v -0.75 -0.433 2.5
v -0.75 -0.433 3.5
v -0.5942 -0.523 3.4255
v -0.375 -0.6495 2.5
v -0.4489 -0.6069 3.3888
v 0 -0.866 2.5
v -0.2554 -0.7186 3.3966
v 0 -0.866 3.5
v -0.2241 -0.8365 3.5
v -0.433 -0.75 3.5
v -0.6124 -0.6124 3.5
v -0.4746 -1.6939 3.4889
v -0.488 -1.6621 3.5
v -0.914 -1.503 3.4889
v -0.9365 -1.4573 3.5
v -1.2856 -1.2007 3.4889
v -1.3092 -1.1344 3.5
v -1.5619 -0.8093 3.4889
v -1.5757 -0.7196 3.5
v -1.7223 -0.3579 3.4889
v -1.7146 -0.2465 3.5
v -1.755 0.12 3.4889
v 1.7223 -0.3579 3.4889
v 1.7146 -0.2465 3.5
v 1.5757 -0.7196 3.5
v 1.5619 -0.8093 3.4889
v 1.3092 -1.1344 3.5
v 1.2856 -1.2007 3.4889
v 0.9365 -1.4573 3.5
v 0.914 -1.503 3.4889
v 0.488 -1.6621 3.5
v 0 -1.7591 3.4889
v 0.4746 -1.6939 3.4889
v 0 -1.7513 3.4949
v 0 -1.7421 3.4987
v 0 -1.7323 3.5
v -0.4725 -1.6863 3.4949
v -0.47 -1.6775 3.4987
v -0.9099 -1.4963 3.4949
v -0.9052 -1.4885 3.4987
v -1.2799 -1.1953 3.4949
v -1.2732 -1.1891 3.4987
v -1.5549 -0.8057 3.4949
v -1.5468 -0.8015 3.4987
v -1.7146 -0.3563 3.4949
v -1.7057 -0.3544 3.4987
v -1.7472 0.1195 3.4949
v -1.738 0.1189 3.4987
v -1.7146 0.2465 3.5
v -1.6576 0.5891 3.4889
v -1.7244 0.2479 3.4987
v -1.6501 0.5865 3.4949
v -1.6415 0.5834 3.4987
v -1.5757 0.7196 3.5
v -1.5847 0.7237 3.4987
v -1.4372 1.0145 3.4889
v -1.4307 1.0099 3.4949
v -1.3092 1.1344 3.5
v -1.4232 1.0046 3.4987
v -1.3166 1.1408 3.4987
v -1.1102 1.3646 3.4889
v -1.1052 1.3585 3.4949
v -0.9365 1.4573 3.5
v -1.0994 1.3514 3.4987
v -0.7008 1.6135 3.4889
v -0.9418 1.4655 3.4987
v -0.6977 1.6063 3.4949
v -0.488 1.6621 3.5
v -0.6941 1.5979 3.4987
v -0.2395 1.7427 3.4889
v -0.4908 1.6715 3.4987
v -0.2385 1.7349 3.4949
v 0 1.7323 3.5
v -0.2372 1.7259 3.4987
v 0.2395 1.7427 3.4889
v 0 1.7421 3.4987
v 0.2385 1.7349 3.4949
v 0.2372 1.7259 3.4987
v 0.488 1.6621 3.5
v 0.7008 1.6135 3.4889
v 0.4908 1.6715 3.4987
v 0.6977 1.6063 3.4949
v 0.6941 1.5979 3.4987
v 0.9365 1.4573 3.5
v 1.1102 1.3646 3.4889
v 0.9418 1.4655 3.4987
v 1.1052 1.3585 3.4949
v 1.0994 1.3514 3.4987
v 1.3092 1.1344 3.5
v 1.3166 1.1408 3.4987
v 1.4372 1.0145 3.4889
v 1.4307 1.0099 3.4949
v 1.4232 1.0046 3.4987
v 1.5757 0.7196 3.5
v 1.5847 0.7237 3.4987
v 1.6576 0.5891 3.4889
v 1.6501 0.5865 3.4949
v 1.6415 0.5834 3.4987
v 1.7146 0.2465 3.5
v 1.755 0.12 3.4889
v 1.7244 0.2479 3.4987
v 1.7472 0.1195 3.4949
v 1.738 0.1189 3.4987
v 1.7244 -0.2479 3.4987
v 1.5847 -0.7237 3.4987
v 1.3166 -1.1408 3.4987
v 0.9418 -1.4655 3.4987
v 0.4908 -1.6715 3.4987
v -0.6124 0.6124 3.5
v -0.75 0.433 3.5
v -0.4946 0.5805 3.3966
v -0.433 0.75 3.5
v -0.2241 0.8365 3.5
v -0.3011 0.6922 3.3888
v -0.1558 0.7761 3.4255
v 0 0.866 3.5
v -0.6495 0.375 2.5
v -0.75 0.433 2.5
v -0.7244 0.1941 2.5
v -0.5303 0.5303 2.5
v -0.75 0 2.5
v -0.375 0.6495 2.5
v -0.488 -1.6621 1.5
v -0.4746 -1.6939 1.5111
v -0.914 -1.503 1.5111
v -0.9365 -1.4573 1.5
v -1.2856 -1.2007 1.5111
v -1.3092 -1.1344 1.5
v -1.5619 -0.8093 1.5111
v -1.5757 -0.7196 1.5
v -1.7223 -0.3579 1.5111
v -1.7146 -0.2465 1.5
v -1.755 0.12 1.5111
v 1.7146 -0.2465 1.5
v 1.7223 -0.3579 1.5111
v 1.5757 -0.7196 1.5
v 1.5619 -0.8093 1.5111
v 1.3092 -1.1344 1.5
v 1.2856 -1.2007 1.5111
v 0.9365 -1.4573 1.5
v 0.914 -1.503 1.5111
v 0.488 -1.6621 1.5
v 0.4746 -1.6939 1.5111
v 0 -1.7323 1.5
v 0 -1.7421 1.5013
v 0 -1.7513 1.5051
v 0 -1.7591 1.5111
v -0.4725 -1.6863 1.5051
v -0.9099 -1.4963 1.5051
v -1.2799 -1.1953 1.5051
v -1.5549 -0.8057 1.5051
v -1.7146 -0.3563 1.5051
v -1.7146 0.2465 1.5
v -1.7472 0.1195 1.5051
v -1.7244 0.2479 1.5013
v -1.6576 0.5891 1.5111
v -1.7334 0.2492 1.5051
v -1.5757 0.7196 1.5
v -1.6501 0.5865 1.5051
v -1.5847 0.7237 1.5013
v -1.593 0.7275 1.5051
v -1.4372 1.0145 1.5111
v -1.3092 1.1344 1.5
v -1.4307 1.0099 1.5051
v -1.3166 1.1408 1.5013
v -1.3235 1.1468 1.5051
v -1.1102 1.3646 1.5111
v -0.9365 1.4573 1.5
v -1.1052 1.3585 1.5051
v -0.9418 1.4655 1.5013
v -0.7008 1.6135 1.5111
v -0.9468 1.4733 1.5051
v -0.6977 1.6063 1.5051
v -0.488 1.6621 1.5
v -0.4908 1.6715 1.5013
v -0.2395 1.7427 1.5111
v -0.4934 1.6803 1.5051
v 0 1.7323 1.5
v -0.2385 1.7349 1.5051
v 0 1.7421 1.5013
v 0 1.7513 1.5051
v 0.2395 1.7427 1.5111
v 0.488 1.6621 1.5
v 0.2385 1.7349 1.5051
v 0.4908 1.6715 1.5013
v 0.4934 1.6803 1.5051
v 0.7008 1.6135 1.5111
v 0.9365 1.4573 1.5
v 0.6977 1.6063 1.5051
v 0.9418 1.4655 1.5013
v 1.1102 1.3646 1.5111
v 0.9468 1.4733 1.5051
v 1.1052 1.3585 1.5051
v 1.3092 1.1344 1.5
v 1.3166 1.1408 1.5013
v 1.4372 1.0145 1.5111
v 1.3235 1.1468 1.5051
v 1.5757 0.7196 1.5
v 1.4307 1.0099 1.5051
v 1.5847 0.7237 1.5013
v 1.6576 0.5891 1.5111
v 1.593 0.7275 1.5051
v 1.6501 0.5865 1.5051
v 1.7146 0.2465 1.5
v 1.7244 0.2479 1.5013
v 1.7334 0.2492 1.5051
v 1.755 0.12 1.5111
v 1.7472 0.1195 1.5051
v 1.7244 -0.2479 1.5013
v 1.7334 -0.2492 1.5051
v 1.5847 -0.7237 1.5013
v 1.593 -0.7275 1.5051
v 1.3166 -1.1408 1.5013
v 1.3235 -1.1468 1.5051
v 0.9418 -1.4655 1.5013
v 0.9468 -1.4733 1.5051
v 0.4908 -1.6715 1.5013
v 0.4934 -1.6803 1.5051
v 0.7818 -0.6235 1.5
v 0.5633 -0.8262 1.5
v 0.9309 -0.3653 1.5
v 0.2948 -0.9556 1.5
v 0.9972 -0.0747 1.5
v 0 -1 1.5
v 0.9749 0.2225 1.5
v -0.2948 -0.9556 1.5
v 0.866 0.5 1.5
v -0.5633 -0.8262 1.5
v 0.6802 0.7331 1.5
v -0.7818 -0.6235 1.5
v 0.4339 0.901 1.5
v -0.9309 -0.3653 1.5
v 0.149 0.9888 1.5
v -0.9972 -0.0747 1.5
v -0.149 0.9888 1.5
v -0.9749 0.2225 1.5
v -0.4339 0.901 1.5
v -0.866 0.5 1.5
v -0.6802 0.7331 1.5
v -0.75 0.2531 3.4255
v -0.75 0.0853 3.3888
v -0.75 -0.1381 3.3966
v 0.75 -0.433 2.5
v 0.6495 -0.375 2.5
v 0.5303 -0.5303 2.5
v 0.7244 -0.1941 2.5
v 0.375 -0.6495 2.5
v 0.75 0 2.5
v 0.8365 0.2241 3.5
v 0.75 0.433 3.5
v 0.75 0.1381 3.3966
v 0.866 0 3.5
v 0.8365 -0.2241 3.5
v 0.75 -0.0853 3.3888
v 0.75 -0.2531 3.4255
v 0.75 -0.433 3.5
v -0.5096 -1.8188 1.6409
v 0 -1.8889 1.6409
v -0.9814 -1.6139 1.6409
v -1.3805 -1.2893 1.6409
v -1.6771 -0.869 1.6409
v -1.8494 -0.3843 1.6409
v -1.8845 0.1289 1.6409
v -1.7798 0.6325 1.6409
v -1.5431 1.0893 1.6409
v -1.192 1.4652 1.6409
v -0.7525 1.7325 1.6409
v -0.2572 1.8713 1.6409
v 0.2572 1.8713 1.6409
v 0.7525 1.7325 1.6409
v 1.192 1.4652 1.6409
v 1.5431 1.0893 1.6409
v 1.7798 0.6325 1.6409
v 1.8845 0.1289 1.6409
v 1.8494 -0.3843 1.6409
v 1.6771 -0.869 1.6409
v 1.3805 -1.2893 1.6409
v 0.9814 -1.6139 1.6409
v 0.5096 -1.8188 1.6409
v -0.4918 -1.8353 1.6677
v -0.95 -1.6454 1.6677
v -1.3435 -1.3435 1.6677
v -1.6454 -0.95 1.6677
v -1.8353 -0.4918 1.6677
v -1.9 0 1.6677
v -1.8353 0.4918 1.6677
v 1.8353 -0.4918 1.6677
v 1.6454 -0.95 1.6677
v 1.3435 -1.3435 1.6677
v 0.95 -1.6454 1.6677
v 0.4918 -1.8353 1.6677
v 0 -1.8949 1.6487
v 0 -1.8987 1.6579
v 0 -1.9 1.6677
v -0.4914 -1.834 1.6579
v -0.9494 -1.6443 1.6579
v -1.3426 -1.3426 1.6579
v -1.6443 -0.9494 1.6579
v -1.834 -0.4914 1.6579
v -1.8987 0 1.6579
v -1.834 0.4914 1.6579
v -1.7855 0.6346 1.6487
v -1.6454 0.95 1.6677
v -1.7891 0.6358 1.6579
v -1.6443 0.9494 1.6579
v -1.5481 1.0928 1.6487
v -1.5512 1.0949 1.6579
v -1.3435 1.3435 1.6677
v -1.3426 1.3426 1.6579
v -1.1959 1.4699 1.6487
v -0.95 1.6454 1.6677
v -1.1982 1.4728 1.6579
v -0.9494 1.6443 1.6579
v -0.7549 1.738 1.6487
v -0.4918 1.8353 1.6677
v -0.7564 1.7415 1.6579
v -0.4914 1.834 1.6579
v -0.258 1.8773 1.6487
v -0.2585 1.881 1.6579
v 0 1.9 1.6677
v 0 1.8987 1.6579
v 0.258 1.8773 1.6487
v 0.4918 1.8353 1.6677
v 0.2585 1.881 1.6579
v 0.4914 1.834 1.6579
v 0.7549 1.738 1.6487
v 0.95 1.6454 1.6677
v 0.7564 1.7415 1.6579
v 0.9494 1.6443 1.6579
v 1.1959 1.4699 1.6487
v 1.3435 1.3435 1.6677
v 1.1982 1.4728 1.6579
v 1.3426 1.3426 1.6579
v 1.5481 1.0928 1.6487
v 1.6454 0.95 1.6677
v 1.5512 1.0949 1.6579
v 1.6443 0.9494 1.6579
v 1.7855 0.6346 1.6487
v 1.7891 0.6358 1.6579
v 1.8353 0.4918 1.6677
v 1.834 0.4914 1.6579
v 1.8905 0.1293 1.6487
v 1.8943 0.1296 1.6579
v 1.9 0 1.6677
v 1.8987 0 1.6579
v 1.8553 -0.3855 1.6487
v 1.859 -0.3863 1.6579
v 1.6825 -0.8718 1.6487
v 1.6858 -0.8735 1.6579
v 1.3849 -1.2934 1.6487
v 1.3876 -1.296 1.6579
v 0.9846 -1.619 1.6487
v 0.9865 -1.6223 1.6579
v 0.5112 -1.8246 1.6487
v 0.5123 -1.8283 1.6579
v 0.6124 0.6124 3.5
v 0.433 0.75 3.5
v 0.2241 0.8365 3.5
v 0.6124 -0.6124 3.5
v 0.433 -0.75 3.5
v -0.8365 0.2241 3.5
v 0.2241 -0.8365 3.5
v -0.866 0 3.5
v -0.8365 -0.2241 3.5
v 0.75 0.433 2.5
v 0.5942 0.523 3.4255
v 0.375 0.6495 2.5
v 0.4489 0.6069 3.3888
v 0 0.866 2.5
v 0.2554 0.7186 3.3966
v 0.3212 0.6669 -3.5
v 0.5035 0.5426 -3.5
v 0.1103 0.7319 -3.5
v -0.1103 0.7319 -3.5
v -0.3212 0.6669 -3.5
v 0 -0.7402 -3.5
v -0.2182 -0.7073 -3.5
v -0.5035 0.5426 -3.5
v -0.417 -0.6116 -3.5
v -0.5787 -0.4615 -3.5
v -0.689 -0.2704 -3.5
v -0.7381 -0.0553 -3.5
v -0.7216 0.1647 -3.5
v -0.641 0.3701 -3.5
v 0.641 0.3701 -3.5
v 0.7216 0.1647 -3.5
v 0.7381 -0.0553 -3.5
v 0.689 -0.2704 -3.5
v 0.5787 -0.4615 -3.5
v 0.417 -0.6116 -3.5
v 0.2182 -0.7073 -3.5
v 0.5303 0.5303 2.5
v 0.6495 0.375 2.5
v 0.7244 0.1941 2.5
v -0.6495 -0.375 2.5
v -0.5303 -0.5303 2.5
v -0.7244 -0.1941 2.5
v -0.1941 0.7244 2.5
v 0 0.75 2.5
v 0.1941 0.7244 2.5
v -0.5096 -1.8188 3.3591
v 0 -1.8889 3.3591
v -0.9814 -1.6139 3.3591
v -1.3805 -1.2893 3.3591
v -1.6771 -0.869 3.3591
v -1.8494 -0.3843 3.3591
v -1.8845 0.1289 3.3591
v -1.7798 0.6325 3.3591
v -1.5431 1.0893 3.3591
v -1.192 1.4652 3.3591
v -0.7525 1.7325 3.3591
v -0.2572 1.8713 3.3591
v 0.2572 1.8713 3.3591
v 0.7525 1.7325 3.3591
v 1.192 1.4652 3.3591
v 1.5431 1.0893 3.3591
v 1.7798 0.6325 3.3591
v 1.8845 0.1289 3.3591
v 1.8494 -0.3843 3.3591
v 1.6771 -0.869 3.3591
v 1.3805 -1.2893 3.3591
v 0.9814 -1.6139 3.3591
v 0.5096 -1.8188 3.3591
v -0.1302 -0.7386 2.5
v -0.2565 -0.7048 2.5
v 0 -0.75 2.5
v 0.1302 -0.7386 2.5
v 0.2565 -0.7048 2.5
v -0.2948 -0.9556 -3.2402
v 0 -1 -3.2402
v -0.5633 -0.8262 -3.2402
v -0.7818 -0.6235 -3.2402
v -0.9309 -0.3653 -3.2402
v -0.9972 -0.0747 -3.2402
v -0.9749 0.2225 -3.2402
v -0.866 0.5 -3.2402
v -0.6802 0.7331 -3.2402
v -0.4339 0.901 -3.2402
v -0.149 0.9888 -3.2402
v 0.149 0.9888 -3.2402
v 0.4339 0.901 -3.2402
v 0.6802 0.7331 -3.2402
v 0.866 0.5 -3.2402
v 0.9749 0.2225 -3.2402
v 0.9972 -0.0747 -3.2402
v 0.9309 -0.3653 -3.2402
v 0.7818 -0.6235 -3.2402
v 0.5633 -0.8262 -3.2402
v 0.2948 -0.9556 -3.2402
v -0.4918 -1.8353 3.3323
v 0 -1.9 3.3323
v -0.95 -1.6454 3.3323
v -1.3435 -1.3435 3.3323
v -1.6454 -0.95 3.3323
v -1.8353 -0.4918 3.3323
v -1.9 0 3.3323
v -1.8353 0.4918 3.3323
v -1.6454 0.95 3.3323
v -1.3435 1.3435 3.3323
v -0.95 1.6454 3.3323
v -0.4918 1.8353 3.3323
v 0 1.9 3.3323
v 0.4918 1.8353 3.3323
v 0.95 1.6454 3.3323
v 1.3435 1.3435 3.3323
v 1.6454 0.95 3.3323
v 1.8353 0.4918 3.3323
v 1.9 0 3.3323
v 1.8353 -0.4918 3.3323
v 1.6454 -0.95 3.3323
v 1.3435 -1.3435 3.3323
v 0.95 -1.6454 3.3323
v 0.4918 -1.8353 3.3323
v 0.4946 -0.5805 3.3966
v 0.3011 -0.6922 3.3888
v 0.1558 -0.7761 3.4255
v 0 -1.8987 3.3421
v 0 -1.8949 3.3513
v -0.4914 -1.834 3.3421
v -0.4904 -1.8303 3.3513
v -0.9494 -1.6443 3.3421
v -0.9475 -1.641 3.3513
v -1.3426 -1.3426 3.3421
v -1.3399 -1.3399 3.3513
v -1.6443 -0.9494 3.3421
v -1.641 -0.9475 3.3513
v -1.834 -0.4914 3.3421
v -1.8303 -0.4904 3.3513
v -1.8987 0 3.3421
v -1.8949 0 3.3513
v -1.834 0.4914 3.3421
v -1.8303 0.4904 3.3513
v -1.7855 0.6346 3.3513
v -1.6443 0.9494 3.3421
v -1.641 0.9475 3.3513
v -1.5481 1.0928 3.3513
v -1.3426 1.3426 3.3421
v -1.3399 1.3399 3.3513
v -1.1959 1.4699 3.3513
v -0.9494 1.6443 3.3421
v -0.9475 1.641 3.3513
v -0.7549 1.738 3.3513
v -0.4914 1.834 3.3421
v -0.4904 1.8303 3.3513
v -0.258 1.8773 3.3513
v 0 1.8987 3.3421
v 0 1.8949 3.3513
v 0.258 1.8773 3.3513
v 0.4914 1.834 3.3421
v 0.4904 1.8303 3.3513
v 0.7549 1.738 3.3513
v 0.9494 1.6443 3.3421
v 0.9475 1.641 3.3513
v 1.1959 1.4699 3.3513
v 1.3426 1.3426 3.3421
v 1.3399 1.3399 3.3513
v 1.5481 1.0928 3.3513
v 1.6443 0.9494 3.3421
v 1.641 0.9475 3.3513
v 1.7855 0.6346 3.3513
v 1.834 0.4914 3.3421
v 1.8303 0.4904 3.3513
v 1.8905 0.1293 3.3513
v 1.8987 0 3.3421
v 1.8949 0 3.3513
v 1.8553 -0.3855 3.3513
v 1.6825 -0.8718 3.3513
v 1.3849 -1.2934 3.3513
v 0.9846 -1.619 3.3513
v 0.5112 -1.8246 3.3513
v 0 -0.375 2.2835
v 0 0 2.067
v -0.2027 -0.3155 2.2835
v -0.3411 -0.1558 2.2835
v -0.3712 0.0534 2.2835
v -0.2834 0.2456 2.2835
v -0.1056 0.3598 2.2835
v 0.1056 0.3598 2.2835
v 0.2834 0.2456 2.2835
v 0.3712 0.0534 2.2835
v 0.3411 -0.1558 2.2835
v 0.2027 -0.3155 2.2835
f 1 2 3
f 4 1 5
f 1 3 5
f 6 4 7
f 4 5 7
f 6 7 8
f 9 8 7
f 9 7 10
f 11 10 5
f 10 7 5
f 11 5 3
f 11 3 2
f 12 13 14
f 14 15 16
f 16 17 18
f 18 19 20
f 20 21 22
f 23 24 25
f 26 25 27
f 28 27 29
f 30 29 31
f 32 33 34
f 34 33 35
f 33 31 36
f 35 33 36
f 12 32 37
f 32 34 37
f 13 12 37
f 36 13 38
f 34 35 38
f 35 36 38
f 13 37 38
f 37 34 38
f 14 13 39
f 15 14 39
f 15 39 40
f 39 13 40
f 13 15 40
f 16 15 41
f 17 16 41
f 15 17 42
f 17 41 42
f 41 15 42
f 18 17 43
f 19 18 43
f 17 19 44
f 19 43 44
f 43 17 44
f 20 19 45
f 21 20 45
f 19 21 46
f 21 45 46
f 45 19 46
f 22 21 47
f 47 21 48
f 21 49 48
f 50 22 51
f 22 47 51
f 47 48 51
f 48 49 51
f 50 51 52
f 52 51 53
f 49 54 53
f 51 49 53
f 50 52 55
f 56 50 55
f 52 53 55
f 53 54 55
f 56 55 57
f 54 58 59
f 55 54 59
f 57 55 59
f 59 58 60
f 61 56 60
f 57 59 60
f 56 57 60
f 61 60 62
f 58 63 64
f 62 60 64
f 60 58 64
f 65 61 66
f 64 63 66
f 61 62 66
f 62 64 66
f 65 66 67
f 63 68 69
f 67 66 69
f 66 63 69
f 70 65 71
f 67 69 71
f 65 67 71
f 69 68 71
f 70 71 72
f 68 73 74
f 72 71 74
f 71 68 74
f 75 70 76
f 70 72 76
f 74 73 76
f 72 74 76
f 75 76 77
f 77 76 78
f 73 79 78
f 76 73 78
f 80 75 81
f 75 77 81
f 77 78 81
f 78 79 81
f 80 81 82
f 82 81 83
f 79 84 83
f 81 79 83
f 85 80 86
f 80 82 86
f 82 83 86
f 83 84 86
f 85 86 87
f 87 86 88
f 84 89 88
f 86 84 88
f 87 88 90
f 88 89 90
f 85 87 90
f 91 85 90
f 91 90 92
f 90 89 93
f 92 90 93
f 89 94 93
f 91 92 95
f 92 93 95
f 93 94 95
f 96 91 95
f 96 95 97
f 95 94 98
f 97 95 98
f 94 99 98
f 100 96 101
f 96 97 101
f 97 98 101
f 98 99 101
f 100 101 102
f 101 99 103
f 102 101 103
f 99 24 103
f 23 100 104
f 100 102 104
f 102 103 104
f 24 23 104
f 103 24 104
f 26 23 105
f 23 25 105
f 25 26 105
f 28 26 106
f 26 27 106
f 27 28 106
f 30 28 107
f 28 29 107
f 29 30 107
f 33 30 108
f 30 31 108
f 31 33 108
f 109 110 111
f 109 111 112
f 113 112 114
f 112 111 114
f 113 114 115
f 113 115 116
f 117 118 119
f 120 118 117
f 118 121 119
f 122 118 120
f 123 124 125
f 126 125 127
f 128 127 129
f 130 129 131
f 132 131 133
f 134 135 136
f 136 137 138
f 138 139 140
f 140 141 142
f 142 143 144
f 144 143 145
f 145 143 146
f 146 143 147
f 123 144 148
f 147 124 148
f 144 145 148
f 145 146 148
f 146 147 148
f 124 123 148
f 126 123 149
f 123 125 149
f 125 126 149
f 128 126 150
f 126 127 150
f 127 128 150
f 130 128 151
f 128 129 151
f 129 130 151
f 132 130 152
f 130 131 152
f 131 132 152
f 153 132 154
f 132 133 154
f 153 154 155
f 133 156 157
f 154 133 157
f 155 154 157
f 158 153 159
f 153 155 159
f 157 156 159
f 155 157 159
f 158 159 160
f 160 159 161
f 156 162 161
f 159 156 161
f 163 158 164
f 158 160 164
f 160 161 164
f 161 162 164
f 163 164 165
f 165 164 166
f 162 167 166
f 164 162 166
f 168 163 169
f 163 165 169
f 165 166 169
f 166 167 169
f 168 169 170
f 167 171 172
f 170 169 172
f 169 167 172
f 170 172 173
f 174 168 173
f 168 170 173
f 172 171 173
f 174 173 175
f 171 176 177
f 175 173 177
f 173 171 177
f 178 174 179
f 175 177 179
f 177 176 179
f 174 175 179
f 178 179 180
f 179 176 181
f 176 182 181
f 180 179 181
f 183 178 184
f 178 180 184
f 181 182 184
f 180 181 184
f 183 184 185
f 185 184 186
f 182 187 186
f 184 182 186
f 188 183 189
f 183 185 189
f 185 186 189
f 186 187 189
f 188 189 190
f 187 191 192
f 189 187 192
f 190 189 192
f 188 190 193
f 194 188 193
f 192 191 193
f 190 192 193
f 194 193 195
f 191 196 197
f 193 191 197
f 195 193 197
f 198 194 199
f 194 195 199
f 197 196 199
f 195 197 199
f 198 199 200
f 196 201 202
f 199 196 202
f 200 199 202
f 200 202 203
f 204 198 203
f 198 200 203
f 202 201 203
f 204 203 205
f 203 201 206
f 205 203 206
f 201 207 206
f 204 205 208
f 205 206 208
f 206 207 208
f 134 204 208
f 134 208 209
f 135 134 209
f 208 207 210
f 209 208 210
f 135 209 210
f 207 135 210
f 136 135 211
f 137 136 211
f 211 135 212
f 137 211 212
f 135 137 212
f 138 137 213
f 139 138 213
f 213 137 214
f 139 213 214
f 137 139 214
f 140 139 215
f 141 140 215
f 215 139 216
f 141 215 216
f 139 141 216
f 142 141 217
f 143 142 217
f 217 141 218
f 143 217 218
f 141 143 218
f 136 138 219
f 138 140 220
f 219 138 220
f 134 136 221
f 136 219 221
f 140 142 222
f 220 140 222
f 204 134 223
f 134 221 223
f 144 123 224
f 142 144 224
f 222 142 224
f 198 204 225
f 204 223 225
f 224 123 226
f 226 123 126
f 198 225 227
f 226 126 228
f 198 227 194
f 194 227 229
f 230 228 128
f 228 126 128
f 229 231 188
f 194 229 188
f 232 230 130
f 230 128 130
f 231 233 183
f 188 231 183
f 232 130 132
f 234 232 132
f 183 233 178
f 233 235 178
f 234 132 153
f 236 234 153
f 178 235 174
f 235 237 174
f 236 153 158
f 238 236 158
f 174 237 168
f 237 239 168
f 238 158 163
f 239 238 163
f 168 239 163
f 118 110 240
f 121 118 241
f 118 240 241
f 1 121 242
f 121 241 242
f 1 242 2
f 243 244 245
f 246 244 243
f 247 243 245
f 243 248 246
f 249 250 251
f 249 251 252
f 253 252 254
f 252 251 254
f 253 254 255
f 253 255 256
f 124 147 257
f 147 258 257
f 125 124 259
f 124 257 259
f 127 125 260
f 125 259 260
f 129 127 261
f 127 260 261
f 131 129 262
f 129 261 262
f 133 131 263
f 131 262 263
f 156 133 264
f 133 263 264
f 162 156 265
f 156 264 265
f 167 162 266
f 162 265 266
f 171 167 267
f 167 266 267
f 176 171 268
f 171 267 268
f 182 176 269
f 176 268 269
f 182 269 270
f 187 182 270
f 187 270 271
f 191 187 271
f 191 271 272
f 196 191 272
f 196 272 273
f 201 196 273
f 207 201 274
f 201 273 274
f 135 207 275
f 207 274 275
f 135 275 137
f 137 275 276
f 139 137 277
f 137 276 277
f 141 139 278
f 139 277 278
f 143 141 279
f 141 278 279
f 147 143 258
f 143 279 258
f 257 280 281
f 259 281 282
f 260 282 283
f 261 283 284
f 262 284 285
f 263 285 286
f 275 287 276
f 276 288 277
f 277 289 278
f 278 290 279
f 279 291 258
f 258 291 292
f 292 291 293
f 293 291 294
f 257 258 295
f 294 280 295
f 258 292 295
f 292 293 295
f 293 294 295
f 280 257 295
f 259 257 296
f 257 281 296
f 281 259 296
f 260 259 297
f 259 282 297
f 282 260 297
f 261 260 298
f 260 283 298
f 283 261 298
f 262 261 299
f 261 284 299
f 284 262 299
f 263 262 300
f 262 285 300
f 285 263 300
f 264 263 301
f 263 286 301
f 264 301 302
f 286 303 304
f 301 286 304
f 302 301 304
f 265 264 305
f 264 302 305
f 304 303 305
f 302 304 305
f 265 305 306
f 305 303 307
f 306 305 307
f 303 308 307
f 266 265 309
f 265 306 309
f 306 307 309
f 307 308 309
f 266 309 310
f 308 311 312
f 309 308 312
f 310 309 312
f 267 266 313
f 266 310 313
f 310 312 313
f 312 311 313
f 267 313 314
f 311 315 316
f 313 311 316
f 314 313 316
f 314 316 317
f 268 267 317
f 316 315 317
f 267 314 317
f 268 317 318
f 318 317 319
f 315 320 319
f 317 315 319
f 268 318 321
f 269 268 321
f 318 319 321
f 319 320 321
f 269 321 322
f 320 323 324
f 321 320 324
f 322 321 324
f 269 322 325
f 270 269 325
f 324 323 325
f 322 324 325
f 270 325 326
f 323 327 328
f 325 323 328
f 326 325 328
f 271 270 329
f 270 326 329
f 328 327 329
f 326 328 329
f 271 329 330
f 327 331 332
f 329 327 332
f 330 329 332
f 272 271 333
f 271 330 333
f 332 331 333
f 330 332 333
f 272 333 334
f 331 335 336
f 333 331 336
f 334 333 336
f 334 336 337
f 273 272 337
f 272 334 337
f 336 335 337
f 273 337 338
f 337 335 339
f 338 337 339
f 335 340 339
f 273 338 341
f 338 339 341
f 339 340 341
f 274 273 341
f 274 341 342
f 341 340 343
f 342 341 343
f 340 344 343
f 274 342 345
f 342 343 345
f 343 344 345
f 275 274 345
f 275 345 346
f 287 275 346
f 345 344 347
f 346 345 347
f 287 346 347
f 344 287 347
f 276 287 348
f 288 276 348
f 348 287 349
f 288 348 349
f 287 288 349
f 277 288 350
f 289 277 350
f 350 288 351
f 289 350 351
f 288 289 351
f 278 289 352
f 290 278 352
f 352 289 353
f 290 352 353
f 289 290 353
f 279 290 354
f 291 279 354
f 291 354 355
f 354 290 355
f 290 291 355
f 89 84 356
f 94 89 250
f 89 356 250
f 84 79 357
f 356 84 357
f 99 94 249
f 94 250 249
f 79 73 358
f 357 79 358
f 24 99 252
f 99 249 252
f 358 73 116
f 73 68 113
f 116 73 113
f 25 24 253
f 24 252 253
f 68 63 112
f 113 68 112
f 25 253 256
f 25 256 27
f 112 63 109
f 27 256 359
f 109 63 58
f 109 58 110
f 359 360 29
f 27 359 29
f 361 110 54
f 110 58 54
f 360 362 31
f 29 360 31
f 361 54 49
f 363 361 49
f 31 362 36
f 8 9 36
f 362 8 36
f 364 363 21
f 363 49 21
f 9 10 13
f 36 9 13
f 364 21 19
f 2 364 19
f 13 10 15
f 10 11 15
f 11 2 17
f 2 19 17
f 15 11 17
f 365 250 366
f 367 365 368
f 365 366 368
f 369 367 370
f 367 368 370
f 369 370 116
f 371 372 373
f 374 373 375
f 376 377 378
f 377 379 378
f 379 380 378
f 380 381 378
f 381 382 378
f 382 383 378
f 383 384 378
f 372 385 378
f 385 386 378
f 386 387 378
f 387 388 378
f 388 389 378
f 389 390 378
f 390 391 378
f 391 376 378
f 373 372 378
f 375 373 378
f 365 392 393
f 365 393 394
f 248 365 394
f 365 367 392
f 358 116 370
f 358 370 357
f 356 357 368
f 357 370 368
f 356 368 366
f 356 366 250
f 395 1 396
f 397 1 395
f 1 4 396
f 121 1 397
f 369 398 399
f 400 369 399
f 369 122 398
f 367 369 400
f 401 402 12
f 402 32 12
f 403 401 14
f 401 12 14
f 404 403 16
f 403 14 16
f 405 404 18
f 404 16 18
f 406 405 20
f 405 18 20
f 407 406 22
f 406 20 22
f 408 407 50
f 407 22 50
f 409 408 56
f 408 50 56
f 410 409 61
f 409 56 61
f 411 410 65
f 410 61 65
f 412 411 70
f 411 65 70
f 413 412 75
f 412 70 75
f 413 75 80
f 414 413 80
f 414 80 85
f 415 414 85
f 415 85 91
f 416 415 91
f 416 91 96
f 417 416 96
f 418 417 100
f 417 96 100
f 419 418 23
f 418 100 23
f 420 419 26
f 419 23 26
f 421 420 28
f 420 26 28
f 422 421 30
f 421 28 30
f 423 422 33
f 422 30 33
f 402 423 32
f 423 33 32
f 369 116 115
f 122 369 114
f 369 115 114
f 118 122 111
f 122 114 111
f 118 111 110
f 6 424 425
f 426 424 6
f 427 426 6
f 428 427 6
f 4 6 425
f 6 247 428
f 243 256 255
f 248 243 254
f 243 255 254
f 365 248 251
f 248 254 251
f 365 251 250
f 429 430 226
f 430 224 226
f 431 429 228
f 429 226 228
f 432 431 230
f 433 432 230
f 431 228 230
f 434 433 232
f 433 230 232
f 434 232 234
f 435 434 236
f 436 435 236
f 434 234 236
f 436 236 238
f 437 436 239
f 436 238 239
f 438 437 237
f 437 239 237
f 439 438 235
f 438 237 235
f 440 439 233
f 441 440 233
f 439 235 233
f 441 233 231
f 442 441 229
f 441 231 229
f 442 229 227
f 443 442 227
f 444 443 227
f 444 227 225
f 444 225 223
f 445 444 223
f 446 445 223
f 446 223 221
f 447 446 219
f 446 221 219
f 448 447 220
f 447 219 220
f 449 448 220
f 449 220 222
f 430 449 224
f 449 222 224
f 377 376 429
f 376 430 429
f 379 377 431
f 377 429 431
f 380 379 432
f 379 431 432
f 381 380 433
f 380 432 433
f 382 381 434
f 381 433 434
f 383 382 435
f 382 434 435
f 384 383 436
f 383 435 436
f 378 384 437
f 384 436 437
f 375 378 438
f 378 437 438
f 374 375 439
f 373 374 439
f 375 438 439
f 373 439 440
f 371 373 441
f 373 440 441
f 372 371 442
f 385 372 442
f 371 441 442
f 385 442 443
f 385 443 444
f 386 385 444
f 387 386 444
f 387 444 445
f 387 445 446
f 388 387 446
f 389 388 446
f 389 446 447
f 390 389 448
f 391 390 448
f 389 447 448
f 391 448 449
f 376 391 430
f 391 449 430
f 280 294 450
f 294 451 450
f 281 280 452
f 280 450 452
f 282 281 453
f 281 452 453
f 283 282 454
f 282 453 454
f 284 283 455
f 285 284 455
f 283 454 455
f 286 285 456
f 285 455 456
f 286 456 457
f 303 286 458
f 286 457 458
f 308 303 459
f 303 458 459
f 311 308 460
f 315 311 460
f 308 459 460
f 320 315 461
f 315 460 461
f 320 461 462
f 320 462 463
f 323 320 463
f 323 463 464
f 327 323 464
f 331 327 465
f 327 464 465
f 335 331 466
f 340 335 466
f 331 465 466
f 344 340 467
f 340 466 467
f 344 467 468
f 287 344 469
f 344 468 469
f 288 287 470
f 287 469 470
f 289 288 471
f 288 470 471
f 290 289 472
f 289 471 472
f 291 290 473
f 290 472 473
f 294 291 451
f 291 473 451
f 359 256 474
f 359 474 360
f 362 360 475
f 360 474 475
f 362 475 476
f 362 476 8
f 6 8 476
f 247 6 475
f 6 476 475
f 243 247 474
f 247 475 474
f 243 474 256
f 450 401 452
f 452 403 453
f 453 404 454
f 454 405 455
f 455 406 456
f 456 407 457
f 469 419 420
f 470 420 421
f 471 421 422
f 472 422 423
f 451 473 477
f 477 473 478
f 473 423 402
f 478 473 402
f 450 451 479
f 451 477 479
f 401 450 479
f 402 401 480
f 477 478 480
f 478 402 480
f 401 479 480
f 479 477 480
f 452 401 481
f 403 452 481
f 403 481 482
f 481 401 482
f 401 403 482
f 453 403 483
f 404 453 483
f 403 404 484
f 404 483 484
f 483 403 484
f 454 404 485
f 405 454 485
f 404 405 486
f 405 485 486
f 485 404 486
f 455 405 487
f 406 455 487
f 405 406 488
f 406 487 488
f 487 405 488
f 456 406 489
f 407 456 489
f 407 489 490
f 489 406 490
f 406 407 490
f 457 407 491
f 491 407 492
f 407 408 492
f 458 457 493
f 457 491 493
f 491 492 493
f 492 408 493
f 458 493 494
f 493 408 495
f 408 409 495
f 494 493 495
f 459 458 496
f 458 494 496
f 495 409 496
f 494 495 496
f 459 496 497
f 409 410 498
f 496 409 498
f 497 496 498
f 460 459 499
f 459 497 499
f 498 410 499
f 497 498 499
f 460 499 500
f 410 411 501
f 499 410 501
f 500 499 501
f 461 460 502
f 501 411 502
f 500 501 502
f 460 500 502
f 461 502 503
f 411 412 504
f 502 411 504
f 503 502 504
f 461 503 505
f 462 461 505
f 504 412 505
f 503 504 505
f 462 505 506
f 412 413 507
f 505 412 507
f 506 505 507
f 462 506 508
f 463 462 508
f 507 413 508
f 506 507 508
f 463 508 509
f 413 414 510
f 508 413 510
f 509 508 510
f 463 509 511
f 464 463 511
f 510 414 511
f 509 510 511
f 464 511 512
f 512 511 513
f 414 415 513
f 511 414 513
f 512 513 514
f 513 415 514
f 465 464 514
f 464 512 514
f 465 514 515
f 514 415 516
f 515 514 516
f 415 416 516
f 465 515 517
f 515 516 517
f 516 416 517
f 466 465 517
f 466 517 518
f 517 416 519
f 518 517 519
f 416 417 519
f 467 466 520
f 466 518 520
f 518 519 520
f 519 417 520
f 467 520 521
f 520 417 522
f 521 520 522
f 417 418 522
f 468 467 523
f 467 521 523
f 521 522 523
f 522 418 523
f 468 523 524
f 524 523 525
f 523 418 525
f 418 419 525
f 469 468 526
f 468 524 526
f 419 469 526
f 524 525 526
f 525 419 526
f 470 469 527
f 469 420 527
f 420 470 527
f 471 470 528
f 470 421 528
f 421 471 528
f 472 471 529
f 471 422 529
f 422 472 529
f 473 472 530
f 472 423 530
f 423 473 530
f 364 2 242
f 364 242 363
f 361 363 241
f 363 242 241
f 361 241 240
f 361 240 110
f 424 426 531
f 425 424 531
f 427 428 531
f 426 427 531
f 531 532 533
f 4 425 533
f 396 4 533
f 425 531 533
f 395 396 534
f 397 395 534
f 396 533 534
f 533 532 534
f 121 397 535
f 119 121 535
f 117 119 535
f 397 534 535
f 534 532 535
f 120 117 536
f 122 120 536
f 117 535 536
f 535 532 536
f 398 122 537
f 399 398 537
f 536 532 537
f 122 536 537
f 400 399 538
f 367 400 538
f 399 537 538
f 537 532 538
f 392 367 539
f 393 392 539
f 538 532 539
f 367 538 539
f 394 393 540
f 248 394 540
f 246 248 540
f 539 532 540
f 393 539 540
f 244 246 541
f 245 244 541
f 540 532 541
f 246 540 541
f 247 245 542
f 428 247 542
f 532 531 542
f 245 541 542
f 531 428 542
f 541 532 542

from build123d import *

# Parameters (mm, degrees)
CUT_EXTRUDE1_DEPTH = 1


with BuildPart() as part:
    # Sketch3 → Revolve1 (revolve)
    with BuildSketch(Plane(origin=(0, 0, 0), x_dir=(0, 0, -1), z_dir=(1, 0, 0)), mode=Mode.PRIVATE) as revolve1_sk:
        with BuildLine():
            Line((-3.5, 1.732259885), (-3.5, 0.75))
            Line((-3.5, 0.75), (-2.5, 0.75))
            Line((-2.5, 0.75), (-2.5, 0))
            Line((-2.5, 0), (3.5, 0))
            Line((3.5, 0), (3.5, 0.740192379))
            Line((3.5, 0.740192379), (3.240192379, 1))
            Line((3.240192379, 1), (-1.5, 1))
            Line((-1.5, 1), (-1.5, 1.732259885))
            ThreePointArc((-1.5, 1.732259885), (-1.502892578, 1.746801855), (-1.511129942, 1.759129942))
            Line((-1.511129942, 1.759129942), (-1.640870058, 1.888870058))
            ThreePointArc((-1.640870058, 1.888870058), (-1.653198145, 1.897107422), (-1.667740115, 1.9))
            Line((-1.667740115, 1.9), (-3.332259885, 1.9))
            ThreePointArc((-3.332259885, 1.9), (-3.346801855, 1.897107422), (-3.359129942, 1.888870058))
            Line((-3.359129942, 1.888870058), (-3.488870058, 1.759129942))
            ThreePointArc((-3.488870058, 1.759129942), (-3.497107422, 1.746801855), (-3.5, 1.732259885))
        make_face()
    revolve(revolve1_sk.sketch.rotate(Axis((0, 0, 3.5), (0, 0, -1)), 180), axis=Axis((0, 0, 3.5), (0, 0, -1)))

    # Sketch4 → Cut-Extrude1 (cut)
    with BuildSketch(Plane.XY.offset(3.5)):
        Polygon((0, 0.866025404), (-0.75, 0.433012702), (-0.75, -0.433012702), (0, -0.866025404), (0.75, -0.433012702), (0.75, 0.433012702), align=None)
    extrude(amount=-CUT_EXTRUDE1_DEPTH, mode=Mode.SUBTRACT)

    # Cut-Extrude2 cone 1 section (through the dimple's axis) → Cut-Extrude2 (revolve, cut)
    with BuildSketch(Plane(origin=(0, 0, 3.5), x_dir=(0, -1, 0), z_dir=(1, 0, 0))):
        Polygon((0, 0), (0.866025404, 0), (0, 0.866025404), align=None)
    revolve(axis=Axis((0, 0, 3.5), (0, 0, -1)), mode=Mode.SUBTRACT)

    # Cut-Extrude3 cone 1 section (through the dimple's axis) → Cut-Extrude3 (revolve, cut)
    with BuildSketch(Plane(origin=(0, 0, 2.5), x_dir=(0, -1, 0), z_dir=(1, 0, 0))):
        Polygon((0, 0), (0.75, 0), (0, 0.433012702), align=None)
    revolve(axis=Axis((0, 0, 2.5), (0, 0, -1)), mode=Mode.SUBTRACT)


solid = part.part
